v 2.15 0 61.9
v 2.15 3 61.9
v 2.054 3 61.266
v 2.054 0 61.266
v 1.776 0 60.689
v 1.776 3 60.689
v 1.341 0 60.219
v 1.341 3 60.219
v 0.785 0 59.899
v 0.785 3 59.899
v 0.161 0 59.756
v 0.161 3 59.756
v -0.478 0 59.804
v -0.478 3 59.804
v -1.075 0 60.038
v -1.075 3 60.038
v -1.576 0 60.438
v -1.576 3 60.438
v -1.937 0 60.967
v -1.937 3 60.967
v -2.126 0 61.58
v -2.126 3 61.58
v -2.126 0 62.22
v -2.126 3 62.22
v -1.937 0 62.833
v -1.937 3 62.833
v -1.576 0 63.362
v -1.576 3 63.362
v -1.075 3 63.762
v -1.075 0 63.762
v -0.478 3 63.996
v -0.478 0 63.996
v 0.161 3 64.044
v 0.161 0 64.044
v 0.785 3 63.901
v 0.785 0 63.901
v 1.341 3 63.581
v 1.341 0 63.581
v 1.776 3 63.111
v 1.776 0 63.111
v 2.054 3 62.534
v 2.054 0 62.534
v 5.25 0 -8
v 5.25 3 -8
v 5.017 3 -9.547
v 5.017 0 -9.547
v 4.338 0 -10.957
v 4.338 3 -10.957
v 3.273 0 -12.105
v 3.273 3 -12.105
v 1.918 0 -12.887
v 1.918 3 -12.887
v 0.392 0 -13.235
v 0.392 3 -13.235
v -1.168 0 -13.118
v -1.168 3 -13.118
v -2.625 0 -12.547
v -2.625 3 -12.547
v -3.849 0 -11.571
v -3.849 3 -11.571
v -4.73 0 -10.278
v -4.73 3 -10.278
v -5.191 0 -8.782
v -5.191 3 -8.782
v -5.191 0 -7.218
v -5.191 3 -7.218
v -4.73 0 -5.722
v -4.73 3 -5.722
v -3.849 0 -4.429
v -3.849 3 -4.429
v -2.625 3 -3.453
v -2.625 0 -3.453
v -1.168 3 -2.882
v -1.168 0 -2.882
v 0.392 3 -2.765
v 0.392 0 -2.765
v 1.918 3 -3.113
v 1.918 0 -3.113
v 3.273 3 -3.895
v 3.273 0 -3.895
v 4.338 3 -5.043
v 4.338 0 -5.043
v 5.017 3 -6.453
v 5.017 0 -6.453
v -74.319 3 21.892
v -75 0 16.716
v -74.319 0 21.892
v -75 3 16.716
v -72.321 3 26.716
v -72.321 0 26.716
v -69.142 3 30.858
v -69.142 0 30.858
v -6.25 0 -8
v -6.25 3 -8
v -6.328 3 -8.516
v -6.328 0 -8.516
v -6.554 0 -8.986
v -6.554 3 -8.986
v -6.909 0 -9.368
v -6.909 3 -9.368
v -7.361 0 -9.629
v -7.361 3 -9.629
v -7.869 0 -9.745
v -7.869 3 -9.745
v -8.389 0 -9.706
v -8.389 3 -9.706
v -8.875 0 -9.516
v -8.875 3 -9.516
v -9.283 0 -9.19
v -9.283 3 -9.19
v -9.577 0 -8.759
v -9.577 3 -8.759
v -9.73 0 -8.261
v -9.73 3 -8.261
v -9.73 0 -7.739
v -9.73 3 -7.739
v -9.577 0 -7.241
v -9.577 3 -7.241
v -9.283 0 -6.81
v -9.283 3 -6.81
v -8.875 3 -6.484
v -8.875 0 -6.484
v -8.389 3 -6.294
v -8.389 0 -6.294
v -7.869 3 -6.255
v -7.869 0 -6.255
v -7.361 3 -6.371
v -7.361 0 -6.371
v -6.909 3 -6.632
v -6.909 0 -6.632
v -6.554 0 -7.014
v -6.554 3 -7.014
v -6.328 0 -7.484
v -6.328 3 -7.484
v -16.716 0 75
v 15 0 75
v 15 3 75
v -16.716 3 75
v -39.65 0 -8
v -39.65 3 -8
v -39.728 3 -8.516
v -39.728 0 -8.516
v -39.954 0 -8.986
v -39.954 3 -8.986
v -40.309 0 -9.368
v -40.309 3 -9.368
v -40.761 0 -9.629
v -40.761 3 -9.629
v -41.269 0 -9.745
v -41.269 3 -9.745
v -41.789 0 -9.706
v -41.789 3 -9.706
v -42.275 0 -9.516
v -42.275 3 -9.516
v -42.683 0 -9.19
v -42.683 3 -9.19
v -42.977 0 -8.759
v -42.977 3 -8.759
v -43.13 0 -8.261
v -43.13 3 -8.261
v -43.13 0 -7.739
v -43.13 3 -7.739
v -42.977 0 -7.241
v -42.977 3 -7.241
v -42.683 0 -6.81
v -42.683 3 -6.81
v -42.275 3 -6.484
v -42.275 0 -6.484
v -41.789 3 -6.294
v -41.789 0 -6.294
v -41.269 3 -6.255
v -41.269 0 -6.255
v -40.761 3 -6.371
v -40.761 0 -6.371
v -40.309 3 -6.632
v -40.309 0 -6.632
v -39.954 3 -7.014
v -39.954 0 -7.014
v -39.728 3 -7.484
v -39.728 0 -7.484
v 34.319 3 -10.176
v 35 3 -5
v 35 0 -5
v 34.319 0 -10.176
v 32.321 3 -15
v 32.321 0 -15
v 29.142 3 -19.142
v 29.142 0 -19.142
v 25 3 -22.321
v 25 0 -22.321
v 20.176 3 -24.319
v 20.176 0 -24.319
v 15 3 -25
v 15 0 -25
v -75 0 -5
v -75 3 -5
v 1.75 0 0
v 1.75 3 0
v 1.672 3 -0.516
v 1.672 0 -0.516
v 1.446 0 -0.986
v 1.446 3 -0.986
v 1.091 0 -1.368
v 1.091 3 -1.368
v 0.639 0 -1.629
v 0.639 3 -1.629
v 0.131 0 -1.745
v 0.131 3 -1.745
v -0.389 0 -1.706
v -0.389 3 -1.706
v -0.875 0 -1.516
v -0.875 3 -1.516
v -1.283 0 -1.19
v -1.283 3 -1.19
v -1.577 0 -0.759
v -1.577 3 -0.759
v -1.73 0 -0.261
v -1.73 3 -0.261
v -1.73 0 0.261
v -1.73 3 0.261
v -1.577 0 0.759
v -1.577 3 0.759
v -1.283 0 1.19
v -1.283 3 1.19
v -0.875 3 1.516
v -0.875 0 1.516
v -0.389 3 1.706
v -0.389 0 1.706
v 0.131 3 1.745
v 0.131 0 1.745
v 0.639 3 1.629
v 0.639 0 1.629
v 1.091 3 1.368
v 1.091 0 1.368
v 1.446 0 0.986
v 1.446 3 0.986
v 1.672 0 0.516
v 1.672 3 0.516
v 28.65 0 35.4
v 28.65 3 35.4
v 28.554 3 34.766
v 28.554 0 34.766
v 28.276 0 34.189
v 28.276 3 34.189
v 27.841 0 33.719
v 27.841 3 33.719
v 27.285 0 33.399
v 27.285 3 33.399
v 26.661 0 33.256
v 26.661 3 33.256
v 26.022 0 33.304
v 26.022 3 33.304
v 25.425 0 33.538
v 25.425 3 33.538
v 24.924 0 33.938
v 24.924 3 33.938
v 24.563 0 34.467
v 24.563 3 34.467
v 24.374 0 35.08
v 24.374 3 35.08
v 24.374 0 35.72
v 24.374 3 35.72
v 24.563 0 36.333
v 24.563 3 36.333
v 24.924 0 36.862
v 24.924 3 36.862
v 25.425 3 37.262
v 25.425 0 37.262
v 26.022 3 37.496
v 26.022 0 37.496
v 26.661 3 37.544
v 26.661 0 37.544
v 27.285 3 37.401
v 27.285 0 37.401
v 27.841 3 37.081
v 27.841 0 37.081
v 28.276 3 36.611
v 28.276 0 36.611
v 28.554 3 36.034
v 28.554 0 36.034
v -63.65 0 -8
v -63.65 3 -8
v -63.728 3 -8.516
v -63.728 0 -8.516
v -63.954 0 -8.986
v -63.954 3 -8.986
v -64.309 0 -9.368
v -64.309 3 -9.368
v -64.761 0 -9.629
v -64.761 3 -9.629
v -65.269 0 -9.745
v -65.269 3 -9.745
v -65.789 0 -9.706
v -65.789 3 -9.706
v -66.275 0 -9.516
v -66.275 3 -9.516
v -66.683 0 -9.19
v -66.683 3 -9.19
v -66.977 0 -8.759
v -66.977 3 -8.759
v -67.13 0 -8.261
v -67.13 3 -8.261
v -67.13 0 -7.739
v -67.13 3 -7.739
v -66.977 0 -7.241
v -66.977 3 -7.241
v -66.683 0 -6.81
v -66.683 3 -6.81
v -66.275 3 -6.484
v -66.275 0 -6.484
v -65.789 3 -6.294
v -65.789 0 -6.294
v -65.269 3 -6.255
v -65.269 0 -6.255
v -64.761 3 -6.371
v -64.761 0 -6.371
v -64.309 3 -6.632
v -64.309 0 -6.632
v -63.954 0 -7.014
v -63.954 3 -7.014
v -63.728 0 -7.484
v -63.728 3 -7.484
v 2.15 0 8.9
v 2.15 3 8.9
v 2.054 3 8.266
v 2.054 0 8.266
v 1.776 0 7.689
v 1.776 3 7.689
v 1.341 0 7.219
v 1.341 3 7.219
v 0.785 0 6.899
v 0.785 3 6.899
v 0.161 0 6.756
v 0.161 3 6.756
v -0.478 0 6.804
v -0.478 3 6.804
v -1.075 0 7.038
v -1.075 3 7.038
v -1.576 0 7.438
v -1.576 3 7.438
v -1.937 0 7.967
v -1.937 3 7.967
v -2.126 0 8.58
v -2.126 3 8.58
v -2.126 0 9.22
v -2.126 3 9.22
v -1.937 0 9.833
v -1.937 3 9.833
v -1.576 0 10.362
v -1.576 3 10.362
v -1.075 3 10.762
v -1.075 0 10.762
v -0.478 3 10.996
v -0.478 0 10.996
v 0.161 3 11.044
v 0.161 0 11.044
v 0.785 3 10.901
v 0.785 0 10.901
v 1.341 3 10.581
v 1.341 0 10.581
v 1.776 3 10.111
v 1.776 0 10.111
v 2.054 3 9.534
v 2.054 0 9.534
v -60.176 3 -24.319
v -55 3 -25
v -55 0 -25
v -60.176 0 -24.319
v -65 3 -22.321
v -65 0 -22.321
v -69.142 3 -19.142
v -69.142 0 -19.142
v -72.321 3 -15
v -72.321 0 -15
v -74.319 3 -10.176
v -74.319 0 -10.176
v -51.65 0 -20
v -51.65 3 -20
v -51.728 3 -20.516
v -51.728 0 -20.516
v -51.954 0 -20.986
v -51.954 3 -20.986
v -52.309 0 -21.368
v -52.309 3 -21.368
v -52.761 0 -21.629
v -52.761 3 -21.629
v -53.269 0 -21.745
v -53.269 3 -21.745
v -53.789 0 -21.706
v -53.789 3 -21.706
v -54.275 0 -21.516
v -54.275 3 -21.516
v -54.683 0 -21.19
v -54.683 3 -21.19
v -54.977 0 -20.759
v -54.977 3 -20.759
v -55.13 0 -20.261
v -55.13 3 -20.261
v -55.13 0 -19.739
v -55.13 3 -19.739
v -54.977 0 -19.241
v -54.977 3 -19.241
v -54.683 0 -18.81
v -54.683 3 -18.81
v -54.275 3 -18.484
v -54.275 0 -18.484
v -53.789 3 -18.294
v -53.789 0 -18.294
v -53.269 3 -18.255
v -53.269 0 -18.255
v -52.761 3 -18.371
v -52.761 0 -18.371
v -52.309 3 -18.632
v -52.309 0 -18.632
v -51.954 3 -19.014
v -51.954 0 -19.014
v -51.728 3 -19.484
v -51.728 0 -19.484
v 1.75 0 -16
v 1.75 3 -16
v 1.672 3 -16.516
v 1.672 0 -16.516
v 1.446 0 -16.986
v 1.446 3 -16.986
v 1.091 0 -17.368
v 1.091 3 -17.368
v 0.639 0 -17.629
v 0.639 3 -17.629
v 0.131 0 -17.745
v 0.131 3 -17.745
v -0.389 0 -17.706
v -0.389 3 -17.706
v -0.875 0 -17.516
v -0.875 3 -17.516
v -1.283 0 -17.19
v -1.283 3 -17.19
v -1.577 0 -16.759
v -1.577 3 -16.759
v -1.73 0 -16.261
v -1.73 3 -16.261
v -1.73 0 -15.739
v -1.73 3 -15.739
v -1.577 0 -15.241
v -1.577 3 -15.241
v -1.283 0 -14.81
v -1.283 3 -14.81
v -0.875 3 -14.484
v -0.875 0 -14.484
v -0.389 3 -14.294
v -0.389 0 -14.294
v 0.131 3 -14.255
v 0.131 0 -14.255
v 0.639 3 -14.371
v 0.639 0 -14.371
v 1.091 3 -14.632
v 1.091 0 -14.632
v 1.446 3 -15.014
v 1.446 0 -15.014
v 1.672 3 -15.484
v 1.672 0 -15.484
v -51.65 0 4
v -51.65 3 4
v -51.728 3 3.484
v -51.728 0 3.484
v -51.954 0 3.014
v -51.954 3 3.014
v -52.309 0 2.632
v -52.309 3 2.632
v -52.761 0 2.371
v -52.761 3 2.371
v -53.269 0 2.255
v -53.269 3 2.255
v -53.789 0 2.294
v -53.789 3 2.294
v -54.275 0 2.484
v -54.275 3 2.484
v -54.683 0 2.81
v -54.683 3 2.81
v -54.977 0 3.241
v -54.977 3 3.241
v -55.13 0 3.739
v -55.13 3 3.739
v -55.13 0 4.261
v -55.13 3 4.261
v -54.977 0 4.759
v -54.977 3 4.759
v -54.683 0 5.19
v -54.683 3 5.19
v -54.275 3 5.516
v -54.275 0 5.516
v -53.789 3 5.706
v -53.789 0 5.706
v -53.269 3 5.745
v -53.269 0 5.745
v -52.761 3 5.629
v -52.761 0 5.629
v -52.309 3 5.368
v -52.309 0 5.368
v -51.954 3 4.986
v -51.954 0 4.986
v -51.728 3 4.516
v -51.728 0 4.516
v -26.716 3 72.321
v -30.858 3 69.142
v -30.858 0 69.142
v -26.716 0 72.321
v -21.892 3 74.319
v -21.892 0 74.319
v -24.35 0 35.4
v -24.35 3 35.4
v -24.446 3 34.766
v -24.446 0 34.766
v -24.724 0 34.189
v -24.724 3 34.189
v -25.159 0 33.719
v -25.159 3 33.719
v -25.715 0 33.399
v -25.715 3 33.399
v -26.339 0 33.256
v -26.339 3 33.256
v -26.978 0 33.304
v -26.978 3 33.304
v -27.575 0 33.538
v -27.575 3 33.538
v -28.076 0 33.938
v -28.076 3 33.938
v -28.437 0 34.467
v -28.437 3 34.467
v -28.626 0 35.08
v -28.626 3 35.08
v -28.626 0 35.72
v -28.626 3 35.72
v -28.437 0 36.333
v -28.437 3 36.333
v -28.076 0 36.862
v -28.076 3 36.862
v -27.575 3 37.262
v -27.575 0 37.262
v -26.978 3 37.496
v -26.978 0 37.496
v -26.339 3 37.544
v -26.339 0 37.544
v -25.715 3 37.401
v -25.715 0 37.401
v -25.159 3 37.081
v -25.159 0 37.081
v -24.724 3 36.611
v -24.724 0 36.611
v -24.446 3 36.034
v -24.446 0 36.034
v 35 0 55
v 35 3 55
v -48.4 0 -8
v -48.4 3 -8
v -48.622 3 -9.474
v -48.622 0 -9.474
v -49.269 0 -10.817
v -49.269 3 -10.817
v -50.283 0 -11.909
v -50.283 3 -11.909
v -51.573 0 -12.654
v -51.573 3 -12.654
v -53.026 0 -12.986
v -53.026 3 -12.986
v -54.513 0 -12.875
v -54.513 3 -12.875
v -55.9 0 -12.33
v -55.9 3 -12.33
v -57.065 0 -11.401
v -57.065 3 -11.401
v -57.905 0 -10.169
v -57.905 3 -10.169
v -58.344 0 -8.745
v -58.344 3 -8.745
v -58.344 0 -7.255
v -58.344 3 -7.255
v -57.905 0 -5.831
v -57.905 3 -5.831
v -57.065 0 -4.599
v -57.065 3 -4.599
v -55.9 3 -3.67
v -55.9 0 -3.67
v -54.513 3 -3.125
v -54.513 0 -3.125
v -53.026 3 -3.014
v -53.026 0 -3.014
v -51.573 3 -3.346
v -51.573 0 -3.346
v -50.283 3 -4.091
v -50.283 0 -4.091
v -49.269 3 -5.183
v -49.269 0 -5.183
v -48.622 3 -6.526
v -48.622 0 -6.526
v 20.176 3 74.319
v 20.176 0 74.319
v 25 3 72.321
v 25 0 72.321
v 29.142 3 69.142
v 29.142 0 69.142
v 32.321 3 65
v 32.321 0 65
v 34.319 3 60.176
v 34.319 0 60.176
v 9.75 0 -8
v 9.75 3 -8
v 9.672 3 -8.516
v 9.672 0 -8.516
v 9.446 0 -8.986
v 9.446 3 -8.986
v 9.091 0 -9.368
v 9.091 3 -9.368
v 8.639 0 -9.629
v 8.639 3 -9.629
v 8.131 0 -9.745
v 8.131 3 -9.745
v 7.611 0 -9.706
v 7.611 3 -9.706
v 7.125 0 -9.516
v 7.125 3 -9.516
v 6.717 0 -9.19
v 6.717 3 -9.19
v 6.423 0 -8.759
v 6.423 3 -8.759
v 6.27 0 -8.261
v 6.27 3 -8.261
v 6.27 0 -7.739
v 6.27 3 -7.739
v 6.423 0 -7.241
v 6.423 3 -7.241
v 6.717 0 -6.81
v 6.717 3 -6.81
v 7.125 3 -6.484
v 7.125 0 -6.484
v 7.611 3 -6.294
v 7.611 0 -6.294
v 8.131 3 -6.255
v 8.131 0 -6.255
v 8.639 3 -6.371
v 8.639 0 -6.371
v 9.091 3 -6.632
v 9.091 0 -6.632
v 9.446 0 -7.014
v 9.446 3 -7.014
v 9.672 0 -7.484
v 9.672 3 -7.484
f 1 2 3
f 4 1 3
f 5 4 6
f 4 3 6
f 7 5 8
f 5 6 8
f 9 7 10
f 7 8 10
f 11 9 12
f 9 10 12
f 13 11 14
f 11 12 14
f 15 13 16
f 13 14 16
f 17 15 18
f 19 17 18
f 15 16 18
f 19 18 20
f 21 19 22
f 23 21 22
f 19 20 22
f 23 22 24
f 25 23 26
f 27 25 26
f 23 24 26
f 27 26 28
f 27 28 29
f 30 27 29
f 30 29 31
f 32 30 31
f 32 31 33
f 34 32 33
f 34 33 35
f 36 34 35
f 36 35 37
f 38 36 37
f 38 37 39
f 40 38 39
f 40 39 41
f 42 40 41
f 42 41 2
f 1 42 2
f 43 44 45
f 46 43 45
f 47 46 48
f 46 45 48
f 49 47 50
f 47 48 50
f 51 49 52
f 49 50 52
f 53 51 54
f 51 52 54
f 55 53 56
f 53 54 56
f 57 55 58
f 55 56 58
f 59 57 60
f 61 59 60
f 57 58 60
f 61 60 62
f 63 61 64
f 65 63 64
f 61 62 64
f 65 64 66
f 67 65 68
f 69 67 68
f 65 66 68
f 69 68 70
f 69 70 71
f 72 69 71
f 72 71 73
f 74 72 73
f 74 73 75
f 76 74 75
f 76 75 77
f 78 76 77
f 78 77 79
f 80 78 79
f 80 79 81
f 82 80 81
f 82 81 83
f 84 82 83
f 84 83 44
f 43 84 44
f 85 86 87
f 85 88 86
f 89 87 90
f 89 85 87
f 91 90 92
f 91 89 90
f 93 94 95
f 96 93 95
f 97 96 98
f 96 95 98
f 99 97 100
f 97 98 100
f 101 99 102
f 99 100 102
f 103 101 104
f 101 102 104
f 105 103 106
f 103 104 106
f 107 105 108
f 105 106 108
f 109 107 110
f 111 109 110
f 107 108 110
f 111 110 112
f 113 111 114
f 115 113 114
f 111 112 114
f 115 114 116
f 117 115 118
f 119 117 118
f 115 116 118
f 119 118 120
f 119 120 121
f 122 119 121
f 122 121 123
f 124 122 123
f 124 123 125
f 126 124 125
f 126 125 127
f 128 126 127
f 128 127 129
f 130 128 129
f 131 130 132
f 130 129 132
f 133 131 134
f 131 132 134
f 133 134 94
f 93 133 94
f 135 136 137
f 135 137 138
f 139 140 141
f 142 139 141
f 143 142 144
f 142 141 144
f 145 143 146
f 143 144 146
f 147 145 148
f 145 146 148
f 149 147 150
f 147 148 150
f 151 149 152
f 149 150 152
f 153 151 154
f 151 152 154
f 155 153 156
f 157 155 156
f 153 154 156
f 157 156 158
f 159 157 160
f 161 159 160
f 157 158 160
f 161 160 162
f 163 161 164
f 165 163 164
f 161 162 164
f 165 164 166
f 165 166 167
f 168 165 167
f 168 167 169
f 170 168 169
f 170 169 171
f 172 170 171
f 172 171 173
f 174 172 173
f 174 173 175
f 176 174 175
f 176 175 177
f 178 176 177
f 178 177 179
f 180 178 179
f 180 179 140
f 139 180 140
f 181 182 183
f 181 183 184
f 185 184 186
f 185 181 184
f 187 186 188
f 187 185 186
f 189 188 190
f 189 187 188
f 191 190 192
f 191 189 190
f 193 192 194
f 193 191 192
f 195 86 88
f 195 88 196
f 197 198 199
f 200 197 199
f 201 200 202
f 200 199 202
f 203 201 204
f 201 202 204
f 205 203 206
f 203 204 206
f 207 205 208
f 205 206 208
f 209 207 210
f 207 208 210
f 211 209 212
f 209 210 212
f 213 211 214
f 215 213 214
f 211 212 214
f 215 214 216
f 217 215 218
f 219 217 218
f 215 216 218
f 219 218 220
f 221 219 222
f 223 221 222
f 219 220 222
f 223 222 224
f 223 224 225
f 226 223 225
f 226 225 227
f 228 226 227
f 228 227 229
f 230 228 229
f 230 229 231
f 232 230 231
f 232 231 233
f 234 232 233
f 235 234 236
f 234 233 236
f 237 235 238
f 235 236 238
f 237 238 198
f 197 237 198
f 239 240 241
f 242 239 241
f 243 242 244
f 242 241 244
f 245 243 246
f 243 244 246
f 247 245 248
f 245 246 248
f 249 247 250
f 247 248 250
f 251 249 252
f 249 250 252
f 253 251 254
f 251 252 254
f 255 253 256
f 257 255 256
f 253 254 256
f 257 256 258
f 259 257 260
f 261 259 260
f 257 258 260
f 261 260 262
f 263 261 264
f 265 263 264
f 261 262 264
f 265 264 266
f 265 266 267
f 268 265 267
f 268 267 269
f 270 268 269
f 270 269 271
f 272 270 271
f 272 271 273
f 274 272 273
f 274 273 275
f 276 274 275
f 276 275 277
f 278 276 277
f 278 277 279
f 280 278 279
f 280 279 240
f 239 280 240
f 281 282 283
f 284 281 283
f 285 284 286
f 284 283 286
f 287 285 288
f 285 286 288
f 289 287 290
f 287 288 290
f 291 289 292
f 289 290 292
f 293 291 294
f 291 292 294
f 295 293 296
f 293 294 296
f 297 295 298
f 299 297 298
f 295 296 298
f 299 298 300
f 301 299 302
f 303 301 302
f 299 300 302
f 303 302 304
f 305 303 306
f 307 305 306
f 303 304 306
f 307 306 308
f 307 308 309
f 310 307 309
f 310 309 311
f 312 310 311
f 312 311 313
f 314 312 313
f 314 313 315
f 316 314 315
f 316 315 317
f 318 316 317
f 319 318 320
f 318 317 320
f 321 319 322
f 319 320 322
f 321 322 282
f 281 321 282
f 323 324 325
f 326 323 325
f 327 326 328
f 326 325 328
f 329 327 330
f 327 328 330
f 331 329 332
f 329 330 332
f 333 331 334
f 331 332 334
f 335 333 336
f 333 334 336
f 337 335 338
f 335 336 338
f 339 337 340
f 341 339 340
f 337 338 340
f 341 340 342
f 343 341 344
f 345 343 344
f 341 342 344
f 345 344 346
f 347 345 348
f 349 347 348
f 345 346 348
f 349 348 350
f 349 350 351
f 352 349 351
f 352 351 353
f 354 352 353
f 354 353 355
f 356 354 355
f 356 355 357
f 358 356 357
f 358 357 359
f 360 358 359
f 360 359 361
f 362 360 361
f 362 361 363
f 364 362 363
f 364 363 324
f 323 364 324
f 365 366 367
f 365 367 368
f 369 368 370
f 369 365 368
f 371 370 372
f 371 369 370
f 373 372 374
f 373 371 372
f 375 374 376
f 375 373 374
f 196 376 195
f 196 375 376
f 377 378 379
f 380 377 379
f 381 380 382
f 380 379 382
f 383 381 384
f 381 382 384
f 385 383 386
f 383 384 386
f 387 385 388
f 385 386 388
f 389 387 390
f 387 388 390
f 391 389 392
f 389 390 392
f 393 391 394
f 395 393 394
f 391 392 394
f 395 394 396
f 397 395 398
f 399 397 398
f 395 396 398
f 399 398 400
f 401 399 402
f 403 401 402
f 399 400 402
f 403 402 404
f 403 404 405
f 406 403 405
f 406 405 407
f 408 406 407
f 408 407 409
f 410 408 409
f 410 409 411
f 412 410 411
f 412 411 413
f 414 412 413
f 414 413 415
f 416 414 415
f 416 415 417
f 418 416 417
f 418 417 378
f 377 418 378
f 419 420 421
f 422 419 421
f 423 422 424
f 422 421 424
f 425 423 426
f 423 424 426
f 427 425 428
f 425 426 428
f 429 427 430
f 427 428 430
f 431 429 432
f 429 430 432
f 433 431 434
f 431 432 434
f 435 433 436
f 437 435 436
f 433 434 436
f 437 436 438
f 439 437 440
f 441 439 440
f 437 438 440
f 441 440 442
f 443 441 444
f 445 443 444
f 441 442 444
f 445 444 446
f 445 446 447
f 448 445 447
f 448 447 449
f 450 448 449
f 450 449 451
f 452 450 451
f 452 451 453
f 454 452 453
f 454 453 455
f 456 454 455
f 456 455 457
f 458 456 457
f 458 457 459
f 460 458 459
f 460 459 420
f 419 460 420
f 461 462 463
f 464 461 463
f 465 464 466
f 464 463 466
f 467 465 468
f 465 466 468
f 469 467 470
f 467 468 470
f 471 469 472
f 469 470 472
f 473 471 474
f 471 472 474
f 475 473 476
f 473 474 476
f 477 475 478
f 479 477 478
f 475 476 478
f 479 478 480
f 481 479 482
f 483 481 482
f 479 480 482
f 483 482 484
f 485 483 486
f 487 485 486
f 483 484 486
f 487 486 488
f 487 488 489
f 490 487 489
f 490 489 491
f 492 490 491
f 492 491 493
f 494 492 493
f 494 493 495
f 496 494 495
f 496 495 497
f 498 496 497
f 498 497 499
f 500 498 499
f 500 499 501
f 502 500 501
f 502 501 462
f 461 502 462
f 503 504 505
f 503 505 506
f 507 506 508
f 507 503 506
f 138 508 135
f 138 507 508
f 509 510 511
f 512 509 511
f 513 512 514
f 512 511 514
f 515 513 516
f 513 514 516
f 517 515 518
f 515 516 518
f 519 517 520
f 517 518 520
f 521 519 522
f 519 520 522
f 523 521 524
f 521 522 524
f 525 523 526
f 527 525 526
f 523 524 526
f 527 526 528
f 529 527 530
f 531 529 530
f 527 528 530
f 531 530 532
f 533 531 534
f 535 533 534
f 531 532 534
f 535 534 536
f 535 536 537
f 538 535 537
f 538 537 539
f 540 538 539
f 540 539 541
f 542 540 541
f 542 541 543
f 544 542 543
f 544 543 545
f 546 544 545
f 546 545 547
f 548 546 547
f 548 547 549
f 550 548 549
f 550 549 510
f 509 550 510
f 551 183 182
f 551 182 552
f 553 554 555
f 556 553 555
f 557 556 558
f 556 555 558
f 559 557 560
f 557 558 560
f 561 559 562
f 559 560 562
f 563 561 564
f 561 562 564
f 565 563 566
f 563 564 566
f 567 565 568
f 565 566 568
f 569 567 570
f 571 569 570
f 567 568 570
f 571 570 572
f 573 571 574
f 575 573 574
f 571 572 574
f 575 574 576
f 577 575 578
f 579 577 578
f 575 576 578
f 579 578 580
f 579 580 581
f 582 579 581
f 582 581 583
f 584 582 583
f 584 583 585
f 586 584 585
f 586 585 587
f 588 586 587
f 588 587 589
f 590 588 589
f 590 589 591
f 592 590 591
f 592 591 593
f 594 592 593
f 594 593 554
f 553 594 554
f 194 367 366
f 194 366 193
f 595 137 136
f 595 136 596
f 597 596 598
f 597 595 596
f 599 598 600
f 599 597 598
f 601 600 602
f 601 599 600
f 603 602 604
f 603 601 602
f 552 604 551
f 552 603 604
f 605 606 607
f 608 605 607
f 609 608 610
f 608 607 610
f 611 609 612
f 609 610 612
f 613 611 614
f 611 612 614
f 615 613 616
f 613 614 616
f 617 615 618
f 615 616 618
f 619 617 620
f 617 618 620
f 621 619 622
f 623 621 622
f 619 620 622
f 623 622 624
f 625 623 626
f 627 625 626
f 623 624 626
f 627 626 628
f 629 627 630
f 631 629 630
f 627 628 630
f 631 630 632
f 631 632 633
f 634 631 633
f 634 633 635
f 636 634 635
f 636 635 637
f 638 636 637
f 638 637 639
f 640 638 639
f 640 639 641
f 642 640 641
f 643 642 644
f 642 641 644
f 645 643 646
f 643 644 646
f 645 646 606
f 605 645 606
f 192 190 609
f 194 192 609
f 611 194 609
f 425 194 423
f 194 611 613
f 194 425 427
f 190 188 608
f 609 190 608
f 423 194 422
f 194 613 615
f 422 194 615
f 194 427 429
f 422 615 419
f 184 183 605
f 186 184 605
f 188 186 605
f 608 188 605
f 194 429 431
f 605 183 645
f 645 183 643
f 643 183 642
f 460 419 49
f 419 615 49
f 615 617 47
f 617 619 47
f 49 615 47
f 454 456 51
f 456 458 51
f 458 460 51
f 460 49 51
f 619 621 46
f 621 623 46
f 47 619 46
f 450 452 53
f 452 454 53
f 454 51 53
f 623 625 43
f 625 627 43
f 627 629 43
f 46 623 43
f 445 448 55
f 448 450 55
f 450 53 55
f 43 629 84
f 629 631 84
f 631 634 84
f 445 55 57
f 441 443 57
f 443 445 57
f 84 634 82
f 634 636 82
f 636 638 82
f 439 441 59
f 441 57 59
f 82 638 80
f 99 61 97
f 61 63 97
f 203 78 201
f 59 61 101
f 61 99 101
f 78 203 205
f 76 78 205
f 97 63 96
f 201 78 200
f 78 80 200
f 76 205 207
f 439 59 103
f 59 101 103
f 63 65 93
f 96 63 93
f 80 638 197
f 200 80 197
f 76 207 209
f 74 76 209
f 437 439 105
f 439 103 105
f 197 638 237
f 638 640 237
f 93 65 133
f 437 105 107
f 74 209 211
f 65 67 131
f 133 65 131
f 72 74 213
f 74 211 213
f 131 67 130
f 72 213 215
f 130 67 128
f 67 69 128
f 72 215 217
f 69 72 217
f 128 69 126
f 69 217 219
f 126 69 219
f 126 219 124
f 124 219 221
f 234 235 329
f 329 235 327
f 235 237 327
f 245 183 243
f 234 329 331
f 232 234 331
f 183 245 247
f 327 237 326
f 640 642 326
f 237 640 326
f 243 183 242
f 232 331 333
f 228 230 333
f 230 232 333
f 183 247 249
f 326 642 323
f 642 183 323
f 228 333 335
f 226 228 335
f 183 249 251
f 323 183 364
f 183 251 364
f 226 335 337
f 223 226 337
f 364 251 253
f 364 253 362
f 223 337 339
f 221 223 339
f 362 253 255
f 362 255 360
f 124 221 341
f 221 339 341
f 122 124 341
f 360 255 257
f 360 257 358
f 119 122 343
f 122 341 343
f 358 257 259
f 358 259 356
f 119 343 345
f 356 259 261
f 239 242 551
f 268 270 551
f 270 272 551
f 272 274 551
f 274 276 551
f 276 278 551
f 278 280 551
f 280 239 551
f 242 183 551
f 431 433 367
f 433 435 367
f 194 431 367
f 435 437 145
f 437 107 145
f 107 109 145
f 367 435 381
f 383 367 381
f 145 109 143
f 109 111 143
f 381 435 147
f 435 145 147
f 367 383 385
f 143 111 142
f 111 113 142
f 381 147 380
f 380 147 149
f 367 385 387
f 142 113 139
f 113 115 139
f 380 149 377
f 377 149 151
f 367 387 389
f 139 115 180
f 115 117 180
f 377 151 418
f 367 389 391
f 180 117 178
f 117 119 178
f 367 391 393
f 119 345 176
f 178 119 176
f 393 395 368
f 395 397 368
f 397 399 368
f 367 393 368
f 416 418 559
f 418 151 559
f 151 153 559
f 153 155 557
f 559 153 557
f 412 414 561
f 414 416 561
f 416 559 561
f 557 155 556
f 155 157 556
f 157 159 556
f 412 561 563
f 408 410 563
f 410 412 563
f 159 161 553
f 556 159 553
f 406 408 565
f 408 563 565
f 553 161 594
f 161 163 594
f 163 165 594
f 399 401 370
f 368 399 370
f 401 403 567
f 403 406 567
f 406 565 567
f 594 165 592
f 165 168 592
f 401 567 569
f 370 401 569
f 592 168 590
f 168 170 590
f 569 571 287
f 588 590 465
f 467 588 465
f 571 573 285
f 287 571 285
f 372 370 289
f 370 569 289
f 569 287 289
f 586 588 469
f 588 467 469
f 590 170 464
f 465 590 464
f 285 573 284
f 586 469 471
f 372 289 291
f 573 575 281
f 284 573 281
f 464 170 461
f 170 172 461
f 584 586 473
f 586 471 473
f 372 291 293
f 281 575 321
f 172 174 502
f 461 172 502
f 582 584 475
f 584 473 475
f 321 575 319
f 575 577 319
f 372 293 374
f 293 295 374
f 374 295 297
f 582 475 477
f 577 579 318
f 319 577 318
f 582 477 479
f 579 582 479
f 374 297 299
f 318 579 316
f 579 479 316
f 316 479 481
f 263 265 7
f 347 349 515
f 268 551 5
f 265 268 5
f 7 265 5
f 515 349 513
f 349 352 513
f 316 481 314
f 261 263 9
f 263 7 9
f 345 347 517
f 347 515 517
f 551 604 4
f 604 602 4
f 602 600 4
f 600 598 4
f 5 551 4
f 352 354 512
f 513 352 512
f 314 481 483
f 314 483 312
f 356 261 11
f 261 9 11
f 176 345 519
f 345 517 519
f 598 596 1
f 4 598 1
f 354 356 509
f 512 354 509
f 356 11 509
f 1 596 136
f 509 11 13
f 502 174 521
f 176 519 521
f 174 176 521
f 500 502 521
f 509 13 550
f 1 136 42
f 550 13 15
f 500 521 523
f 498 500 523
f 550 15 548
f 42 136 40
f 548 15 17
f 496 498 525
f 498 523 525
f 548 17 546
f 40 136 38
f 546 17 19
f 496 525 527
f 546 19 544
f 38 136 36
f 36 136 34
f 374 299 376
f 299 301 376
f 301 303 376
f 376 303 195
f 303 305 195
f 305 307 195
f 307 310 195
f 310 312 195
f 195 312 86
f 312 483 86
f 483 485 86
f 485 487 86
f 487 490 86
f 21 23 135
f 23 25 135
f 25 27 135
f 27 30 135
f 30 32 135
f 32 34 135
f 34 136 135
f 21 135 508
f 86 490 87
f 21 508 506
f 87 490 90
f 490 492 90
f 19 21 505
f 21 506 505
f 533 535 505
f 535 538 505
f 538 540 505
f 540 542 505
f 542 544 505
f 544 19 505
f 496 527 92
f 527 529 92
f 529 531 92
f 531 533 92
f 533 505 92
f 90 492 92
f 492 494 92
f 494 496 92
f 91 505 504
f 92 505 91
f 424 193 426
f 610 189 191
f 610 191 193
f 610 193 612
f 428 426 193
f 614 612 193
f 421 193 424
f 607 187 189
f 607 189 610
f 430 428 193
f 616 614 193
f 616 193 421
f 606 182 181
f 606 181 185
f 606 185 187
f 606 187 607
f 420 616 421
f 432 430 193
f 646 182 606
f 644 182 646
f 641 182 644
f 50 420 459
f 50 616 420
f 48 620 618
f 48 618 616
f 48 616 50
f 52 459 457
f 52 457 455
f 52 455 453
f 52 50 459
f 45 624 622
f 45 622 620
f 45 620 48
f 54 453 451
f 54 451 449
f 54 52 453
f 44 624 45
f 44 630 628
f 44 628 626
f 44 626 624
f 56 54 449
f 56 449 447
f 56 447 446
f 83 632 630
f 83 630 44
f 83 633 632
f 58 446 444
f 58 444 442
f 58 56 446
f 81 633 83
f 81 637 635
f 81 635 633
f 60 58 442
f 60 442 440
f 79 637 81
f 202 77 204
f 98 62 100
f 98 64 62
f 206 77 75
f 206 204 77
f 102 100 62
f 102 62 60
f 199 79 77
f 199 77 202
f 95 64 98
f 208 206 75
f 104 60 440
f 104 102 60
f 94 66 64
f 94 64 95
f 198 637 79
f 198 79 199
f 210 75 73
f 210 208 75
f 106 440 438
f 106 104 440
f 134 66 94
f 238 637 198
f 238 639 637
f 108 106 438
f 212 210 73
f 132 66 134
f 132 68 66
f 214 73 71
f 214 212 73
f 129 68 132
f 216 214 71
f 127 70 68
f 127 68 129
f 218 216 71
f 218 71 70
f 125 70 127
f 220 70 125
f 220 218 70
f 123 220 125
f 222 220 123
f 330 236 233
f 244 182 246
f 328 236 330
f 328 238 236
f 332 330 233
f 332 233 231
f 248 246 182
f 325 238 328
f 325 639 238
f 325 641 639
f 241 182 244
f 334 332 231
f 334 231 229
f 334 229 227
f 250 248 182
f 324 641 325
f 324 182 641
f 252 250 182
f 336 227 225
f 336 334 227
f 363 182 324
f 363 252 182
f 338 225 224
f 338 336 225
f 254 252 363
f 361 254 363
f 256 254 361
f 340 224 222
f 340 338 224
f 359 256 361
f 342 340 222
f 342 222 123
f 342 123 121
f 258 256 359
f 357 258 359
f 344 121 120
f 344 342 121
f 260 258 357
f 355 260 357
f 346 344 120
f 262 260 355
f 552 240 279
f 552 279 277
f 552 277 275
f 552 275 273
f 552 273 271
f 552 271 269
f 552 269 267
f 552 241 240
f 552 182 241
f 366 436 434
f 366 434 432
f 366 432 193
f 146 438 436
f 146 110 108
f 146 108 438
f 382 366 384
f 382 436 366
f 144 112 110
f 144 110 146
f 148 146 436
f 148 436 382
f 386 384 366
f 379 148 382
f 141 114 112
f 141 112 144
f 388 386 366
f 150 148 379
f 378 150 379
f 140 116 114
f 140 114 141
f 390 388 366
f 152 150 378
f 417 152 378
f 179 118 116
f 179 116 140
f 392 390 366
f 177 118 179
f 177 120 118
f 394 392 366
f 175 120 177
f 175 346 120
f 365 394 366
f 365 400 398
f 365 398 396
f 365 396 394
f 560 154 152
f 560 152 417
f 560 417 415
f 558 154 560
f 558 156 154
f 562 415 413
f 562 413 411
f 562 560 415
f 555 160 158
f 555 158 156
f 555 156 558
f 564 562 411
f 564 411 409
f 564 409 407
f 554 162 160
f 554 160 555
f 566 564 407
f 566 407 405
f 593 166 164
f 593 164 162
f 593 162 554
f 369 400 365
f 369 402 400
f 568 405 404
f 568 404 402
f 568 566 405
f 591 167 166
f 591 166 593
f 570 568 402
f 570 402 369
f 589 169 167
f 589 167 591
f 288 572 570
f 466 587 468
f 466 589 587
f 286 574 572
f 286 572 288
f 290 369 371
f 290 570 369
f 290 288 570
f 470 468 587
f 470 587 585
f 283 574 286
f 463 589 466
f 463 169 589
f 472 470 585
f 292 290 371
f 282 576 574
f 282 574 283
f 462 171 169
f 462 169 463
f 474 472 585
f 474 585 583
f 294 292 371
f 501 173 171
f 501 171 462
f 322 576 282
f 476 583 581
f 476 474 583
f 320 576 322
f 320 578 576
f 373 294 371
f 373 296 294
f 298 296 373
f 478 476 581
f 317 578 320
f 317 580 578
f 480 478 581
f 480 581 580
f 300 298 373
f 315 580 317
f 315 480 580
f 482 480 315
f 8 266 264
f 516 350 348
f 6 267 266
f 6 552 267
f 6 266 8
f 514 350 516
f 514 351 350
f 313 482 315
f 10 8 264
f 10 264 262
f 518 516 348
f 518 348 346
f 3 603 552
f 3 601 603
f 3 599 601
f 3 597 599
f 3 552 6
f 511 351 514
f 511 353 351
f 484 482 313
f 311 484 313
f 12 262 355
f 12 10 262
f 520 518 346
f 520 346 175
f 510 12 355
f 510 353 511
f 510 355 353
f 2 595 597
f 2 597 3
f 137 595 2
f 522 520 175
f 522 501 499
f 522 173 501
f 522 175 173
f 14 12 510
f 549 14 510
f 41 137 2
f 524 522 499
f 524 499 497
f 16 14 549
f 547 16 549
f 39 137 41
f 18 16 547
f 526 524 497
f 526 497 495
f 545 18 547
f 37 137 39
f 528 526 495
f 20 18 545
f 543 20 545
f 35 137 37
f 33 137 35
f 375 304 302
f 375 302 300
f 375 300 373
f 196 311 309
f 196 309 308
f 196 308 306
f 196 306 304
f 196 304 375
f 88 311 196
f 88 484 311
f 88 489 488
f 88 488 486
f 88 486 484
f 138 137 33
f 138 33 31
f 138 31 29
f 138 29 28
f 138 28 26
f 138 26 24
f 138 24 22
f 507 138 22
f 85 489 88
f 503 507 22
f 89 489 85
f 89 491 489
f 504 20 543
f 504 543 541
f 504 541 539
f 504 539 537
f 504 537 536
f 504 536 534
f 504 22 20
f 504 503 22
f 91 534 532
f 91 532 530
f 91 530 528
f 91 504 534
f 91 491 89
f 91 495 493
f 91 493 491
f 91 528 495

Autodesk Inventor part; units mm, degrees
ref_plane "YZ Plane" through (0, 0, 0) normal (1, 0, 0) x (0, 1, 0)
ref_plane "XZ Plane" through (0, 0, 0) normal (0, 1, 0) x (-1, 0, 0)
ref_plane "XY Plane" through (0, 0, 0) normal (0, 0, 1) x (1, 0, 0)
sketch "Sketch1" plane through (0, 0, 0) normal (0, 1, 0) x (-1, 0, 0)
  line L0 (-75, 25) -> (75, 25)
  line L1 (75, 25) -> (75, -25)
  line L2 (75, -25) -> (-75, -25)
  line L3 (-75, -25) -> (-75, 25)
  line L4 (-75, 25) -> (75, -25) construction
  line L5 (75, 25) -> (-75, -25) construction
  line L6 (-75, -25) -> (-35, -25)
  line L7 (-35, -25) -> (-35, 25)
  line L8 (-35, 25) -> (-75, 25)
  line L9 (-75, 25) -> (-75, -25)
  line L10 (-35, 25) -> (-35, 75)
  line L11 (-35, 75) -> (75, 75)
  line L12 (75, 75) -> (75, 25)
  line L13 (-35, 75) -> (25, 75)
  line L14 (25, 75) -> (75, 25)
  point P0 (0, 0)
  point P1 (-35, -25)
  dimension "d0" = 150
  dimension "d1" = 50
  dimension "d57" = 40
  dimension "d58" = 50
  dimension "d59" = 50
  dimension "d60" = 60
extrude "Extrusion1" add sketch "Sketch1" along normal blind 3 contours L10 L11 L14 L0 | L0 L1 L2 L7
sketch "Sketch6" plane through (0, 3, 0) normal (0, 1, 0) x (1, 0, 0)
  line L0 (35, 25) -> (-75, 25) projected
  line L1 (0, 25) -> (0, 8)
  circle A0 centre (0, 8) radius 5.25
  line L2 (0, 8) -> (-53.4, 8)
  circle A1 centre (-53.4, 8) radius 5
  circle A2 centre (0, 8) radius 8
  circle A3 centre (0, 16) radius 1.75
  circle A4 centre (-8, 8) radius 1.75
  circle A5 centre (0, 0) radius 1.75
  circle A6 centre (8, 8) radius 1.75
  circle A7 centre (-53.4, 8) radius 12
  line L3 (-53.4, -4) -> (-53.4, 20)
  circle A8 centre (-53.4, 20) radius 1.75
  circle A9 centre (-65.4, 8) radius 1.75
  circle A10 centre (-53.4, -4) radius 1.75
  circle A11 centre (-41.4, 8) radius 1.75
  point P0 (0, 0)
  point P1 (75, 25)
  dimension "d49" = 24
  dimension "d40" = 17
  dimension "d41" = 10.5
  dimension "d42" = 53.4
  dimension "d43" = 10
  dimension "d44" = 3.5
  dimension "d47" = 360
  dimension "d50" = 3.5
  dimension "d53" = 360
extrude "Extrusion6" cut sketch "Sketch6" against normal through all contours A3 A2 L1 | A11 A7 L2 | L2 A7 A11 | L1 A2 A3 | A2 A3 L1 | L1 A3 A2 | A4 L2 A2 | A2 L2 A4 | A0 L2 L1 | L1 L2 A0 | A6 A2 | A2 A6 | A2 A4 L2 | L2 A4 A2 | A5 A2 | A2 A5 | A7 A11 L2 | L2 A11 A7 | A8 L3 A7 | A7 A8 | A10 A7 | A7 L3 A10 | A1 L3 L2 | L2 L3 A1 | L3 A8 A7 | A7 A10 L3 | L3 A1 | A9 A7 | A7 A9
fillet "Fillet1" radius 20 5 edges at (35, 1.5, -25) (35, 1.5, 75) (-25, 1.5, 75) (-75, 1.5, 25) (-75, 1.5, -25)
sketch "Sketch7" plane through (0, 3, 0) normal (0, 1, 0) x (1, 0, 0)
  arc A0 (15, -75) -> (35, -55) centre (15, -55) ccw projected
  line L0 (35, -55) -> (0, -55)
  line L1 (-16.7157, -75) -> (15, -75) projected
  line L2 (0, -75) -> (0, -35.4)
  line L3 (0, -75) -> (39.6, -75) construction
  circle A1 centre (0, -35.4) radius 26.5
  circle A2 centre (0, -61.9) radius 2.15
  circle A3 centre (26.5, -35.4) radius 2.15
  circle A4 centre (0, -8.9) radius 2.15
  circle A5 centre (-26.5, -35.4) radius 2.15
  point P0 (0, 0)
  dimension "d65" = 53
  dimension "d62" = 35
  dimension "d63" = 39.6
  dimension "d64" = 90
  dimension "d66" = 4.3
  dimension "d69" = 360
extrude "Extrusion7" cut sketch "Sketch7" against normal through all contours A2 A1 L2 | L2 A1 A2 | A1 L2 A2 | A3 A1 | A1 A3 | A1 A2 L2 | A5 A1 | A1 A5 | A4 A1 | A1 A4
properties part number "TopMount"
